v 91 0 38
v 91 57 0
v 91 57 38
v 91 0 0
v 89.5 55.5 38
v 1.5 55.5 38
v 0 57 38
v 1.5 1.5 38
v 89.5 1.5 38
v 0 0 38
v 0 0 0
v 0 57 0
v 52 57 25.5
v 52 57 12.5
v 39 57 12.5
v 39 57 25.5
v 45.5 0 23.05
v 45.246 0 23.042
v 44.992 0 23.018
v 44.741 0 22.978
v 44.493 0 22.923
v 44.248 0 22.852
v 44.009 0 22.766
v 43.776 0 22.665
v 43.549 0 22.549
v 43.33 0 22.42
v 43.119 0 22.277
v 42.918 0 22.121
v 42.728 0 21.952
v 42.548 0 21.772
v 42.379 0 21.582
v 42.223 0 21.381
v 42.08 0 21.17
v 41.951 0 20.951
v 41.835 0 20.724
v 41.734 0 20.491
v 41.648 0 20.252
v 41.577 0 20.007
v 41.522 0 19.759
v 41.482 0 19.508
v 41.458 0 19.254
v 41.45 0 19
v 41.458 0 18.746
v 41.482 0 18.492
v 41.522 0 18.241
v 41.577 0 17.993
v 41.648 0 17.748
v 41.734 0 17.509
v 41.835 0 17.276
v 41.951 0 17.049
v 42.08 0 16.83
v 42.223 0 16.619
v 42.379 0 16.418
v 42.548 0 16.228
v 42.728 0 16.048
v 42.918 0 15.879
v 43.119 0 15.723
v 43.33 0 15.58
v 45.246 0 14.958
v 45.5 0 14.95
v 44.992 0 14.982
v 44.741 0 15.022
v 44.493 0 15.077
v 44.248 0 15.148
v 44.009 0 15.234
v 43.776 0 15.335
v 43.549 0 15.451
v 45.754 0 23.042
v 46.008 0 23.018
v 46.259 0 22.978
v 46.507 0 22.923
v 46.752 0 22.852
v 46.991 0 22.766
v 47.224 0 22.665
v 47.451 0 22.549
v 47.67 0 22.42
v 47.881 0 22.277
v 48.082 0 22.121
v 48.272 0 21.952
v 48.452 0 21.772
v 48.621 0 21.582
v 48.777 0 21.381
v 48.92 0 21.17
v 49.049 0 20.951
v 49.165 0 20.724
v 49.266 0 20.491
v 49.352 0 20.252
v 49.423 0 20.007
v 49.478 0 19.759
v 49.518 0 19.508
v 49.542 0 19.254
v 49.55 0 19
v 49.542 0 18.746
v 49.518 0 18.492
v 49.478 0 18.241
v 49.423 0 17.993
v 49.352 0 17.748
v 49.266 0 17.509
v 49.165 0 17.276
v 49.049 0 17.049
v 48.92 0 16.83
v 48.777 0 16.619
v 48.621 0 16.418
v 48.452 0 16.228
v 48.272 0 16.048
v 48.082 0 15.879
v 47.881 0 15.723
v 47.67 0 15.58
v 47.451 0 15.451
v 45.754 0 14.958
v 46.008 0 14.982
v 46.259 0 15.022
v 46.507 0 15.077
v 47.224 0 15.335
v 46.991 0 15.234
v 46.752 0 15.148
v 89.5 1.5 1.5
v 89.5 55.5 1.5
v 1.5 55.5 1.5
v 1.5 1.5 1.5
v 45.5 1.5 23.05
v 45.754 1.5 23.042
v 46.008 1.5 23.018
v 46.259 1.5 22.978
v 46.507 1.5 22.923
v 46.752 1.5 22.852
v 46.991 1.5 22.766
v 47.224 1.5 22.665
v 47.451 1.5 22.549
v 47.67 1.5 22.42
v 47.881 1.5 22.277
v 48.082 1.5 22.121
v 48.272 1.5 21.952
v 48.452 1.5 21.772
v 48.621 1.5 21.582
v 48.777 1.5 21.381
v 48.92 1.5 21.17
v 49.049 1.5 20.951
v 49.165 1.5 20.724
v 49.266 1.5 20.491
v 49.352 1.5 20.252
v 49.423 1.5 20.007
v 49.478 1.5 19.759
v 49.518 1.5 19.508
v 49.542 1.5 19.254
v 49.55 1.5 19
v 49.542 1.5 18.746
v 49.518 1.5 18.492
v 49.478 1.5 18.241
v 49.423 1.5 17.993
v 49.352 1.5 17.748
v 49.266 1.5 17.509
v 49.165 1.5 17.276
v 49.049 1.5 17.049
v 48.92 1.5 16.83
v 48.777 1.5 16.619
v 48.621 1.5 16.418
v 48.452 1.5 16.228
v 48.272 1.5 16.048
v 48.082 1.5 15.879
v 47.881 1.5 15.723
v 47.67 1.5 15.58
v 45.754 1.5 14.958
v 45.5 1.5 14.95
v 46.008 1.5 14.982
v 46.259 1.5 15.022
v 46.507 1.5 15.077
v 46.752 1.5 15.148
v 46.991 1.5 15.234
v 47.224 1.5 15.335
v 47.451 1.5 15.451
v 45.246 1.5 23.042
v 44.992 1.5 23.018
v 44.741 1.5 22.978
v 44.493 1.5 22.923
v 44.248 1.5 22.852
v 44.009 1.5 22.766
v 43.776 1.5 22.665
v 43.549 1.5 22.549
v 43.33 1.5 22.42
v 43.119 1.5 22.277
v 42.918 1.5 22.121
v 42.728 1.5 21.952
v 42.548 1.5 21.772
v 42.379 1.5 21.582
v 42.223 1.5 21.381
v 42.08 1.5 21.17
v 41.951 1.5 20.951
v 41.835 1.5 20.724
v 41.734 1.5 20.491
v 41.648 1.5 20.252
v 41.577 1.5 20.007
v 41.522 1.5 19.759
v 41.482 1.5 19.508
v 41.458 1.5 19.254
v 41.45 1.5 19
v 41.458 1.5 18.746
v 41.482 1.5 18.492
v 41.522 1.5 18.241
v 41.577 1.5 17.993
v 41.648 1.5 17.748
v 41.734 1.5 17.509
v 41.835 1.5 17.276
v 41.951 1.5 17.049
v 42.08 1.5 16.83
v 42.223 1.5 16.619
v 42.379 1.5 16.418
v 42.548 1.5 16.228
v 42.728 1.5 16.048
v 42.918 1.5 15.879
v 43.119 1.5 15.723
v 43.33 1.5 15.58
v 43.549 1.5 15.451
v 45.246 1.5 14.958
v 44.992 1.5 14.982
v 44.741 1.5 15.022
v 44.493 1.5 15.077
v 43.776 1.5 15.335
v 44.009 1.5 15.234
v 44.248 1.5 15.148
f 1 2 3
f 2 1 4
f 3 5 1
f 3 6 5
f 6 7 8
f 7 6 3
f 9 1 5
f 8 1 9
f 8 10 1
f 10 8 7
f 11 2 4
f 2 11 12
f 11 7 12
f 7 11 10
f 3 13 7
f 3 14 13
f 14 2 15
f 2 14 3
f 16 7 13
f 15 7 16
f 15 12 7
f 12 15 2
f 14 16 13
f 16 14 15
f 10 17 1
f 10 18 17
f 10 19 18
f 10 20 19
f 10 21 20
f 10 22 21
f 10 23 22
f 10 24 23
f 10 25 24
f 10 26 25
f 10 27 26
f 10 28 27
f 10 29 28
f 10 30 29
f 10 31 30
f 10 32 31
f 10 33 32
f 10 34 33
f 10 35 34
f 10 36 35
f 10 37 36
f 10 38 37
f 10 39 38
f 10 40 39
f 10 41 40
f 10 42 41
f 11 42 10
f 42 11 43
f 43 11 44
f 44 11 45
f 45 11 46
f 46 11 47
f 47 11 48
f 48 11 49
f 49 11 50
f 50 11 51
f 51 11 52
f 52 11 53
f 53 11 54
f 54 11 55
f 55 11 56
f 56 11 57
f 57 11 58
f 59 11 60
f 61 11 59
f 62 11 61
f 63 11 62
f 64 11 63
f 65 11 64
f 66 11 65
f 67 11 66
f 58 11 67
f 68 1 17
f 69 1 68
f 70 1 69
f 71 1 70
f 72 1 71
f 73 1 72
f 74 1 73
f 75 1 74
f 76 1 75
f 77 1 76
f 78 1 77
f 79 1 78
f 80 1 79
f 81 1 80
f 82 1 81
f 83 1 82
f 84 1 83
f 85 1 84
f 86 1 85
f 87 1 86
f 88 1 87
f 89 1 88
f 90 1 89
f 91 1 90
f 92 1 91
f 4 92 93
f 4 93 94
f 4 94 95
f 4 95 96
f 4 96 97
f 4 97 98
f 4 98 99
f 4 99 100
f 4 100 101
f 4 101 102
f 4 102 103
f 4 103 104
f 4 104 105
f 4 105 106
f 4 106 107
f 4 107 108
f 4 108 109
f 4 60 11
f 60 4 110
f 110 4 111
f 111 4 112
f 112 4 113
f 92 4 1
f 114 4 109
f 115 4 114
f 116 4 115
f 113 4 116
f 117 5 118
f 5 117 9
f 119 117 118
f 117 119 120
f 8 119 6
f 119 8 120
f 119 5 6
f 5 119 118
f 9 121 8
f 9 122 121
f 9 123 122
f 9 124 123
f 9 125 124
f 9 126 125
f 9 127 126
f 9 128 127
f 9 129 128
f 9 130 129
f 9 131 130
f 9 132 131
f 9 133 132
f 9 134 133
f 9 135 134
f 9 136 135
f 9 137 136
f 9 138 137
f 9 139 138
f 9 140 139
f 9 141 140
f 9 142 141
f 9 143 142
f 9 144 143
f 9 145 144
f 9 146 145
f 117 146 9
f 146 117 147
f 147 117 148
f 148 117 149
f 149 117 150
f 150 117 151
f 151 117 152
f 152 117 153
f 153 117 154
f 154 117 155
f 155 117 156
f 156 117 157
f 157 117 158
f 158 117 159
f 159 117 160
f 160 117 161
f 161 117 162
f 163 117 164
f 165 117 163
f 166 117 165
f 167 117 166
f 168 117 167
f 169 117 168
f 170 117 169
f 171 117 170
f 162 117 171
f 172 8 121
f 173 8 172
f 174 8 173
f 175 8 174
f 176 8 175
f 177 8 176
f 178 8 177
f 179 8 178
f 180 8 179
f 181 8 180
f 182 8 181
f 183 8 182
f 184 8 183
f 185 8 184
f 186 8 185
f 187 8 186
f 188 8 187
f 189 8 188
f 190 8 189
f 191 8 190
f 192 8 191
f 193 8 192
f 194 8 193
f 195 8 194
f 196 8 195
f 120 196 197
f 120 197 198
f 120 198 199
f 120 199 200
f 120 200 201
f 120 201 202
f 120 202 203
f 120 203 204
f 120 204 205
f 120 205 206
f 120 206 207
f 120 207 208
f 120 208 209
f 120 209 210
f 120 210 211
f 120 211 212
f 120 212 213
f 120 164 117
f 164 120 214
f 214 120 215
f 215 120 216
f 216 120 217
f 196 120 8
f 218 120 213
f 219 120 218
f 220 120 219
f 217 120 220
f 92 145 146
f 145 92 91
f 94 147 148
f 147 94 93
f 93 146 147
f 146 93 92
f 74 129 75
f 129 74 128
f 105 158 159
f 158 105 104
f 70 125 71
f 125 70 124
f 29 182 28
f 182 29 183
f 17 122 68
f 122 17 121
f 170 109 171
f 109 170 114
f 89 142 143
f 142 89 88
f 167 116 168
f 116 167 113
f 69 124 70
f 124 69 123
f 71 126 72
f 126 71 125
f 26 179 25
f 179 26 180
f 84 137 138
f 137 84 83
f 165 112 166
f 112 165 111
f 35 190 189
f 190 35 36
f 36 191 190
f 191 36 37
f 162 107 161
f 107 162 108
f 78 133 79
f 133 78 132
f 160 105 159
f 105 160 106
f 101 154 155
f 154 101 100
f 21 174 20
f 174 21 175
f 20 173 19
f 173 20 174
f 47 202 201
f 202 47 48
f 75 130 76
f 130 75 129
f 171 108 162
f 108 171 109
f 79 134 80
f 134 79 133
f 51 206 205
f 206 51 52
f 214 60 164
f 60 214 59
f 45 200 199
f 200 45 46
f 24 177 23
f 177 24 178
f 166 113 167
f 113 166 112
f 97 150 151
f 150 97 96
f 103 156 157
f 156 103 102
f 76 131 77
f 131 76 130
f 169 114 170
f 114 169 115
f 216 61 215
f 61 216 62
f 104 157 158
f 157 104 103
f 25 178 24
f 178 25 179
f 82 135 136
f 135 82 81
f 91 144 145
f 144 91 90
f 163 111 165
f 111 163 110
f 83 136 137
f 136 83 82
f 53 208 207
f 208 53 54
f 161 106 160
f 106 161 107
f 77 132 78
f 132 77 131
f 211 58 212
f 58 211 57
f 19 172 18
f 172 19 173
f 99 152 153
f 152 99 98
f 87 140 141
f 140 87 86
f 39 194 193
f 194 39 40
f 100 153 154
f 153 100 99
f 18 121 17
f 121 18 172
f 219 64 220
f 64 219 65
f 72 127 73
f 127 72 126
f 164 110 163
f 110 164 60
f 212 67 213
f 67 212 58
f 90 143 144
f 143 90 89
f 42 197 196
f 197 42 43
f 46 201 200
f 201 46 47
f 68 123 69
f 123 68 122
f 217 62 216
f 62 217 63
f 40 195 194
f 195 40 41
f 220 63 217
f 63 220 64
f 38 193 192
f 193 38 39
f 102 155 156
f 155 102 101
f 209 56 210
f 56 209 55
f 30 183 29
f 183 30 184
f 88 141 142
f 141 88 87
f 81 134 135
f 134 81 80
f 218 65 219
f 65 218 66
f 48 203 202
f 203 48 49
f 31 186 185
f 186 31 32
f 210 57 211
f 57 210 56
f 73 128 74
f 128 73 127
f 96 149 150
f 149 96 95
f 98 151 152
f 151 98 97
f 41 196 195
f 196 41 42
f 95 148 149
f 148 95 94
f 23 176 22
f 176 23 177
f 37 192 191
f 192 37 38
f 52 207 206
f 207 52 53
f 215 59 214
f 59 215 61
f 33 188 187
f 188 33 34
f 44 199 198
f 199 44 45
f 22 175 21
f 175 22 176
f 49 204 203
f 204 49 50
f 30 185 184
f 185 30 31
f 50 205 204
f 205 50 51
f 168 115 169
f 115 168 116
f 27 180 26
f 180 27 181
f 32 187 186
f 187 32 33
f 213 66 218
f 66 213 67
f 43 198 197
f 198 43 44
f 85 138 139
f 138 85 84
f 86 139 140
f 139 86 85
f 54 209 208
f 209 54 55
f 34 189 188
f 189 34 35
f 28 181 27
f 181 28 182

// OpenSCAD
/* Cheerlight Christmas Tree Electronics Box
 *
 * brightcolorfulflickers.tumblr.com
 * instagram.com/brightcolorfulflickers
 * github.com/brightcolorfulflickers
 * instructables.com/member/brightcolorfulflickers/
 * 
 * Dec 2016
 */

wallthick = 1.5;
fnval = 100;
box_width = 91;
box_depth = 57;
box_height = 38;
lid_height = 10;

lightplug_width = 13;
lightplug_height = 13;
lightplug_depth = wallthick;

lightplug_xtranslate = (box_width-lightplug_width)/2;
lightplug_ytranslate = box_depth;
lightplug_ztranslate = (box_height-lightplug_height)/2;

dcjack_r = 8.1/2;

dcjack_xtranslate = (box_width-2*dcjack_r)/2+dcjack_r;
dcjack_ytranslate = 0;
dcjack_ztranslate = (box_height-2*dcjack_r)/2+dcjack_r;

tolerance = .1;

box();
*translate([0,0,lid_height]) rotate([0,180,0]) lid();
// * disables a command, so disable one at a time to render box and lid separately

module lid() {
    difference() {
        cube([box_width+wallthick*2,box_depth+wallthick*2,lid_height], center=false);
        translate([wallthick+tolerance,wallthick+tolerance,0]) cube([box_width+tolerance*2,box_depth+tolerance*2,lid_height-wallthick], center=false);
    }
}

module box() {
    difference() {
        cube([box_width,box_depth,box_height], center=false);
        translate([wallthick,wallthick,wallthick]) cube([box_width-2*wallthick,box_depth-2*wallthick,box_height], center=false);
        translate([lightplug_xtranslate,lightplug_ytranslate,lightplug_ztranslate]) cube([lightplug_width, lightplug_depth, lightplug_height],center=false);
        translate([dcjack_xtranslate,dcjack_ytranslate,dcjack_ztranslate]) rotate([270,0,0]) cylinder(wallthick*1.1, dcjack_r, dcjack_r, false, $fn=fnval);
    }

}
